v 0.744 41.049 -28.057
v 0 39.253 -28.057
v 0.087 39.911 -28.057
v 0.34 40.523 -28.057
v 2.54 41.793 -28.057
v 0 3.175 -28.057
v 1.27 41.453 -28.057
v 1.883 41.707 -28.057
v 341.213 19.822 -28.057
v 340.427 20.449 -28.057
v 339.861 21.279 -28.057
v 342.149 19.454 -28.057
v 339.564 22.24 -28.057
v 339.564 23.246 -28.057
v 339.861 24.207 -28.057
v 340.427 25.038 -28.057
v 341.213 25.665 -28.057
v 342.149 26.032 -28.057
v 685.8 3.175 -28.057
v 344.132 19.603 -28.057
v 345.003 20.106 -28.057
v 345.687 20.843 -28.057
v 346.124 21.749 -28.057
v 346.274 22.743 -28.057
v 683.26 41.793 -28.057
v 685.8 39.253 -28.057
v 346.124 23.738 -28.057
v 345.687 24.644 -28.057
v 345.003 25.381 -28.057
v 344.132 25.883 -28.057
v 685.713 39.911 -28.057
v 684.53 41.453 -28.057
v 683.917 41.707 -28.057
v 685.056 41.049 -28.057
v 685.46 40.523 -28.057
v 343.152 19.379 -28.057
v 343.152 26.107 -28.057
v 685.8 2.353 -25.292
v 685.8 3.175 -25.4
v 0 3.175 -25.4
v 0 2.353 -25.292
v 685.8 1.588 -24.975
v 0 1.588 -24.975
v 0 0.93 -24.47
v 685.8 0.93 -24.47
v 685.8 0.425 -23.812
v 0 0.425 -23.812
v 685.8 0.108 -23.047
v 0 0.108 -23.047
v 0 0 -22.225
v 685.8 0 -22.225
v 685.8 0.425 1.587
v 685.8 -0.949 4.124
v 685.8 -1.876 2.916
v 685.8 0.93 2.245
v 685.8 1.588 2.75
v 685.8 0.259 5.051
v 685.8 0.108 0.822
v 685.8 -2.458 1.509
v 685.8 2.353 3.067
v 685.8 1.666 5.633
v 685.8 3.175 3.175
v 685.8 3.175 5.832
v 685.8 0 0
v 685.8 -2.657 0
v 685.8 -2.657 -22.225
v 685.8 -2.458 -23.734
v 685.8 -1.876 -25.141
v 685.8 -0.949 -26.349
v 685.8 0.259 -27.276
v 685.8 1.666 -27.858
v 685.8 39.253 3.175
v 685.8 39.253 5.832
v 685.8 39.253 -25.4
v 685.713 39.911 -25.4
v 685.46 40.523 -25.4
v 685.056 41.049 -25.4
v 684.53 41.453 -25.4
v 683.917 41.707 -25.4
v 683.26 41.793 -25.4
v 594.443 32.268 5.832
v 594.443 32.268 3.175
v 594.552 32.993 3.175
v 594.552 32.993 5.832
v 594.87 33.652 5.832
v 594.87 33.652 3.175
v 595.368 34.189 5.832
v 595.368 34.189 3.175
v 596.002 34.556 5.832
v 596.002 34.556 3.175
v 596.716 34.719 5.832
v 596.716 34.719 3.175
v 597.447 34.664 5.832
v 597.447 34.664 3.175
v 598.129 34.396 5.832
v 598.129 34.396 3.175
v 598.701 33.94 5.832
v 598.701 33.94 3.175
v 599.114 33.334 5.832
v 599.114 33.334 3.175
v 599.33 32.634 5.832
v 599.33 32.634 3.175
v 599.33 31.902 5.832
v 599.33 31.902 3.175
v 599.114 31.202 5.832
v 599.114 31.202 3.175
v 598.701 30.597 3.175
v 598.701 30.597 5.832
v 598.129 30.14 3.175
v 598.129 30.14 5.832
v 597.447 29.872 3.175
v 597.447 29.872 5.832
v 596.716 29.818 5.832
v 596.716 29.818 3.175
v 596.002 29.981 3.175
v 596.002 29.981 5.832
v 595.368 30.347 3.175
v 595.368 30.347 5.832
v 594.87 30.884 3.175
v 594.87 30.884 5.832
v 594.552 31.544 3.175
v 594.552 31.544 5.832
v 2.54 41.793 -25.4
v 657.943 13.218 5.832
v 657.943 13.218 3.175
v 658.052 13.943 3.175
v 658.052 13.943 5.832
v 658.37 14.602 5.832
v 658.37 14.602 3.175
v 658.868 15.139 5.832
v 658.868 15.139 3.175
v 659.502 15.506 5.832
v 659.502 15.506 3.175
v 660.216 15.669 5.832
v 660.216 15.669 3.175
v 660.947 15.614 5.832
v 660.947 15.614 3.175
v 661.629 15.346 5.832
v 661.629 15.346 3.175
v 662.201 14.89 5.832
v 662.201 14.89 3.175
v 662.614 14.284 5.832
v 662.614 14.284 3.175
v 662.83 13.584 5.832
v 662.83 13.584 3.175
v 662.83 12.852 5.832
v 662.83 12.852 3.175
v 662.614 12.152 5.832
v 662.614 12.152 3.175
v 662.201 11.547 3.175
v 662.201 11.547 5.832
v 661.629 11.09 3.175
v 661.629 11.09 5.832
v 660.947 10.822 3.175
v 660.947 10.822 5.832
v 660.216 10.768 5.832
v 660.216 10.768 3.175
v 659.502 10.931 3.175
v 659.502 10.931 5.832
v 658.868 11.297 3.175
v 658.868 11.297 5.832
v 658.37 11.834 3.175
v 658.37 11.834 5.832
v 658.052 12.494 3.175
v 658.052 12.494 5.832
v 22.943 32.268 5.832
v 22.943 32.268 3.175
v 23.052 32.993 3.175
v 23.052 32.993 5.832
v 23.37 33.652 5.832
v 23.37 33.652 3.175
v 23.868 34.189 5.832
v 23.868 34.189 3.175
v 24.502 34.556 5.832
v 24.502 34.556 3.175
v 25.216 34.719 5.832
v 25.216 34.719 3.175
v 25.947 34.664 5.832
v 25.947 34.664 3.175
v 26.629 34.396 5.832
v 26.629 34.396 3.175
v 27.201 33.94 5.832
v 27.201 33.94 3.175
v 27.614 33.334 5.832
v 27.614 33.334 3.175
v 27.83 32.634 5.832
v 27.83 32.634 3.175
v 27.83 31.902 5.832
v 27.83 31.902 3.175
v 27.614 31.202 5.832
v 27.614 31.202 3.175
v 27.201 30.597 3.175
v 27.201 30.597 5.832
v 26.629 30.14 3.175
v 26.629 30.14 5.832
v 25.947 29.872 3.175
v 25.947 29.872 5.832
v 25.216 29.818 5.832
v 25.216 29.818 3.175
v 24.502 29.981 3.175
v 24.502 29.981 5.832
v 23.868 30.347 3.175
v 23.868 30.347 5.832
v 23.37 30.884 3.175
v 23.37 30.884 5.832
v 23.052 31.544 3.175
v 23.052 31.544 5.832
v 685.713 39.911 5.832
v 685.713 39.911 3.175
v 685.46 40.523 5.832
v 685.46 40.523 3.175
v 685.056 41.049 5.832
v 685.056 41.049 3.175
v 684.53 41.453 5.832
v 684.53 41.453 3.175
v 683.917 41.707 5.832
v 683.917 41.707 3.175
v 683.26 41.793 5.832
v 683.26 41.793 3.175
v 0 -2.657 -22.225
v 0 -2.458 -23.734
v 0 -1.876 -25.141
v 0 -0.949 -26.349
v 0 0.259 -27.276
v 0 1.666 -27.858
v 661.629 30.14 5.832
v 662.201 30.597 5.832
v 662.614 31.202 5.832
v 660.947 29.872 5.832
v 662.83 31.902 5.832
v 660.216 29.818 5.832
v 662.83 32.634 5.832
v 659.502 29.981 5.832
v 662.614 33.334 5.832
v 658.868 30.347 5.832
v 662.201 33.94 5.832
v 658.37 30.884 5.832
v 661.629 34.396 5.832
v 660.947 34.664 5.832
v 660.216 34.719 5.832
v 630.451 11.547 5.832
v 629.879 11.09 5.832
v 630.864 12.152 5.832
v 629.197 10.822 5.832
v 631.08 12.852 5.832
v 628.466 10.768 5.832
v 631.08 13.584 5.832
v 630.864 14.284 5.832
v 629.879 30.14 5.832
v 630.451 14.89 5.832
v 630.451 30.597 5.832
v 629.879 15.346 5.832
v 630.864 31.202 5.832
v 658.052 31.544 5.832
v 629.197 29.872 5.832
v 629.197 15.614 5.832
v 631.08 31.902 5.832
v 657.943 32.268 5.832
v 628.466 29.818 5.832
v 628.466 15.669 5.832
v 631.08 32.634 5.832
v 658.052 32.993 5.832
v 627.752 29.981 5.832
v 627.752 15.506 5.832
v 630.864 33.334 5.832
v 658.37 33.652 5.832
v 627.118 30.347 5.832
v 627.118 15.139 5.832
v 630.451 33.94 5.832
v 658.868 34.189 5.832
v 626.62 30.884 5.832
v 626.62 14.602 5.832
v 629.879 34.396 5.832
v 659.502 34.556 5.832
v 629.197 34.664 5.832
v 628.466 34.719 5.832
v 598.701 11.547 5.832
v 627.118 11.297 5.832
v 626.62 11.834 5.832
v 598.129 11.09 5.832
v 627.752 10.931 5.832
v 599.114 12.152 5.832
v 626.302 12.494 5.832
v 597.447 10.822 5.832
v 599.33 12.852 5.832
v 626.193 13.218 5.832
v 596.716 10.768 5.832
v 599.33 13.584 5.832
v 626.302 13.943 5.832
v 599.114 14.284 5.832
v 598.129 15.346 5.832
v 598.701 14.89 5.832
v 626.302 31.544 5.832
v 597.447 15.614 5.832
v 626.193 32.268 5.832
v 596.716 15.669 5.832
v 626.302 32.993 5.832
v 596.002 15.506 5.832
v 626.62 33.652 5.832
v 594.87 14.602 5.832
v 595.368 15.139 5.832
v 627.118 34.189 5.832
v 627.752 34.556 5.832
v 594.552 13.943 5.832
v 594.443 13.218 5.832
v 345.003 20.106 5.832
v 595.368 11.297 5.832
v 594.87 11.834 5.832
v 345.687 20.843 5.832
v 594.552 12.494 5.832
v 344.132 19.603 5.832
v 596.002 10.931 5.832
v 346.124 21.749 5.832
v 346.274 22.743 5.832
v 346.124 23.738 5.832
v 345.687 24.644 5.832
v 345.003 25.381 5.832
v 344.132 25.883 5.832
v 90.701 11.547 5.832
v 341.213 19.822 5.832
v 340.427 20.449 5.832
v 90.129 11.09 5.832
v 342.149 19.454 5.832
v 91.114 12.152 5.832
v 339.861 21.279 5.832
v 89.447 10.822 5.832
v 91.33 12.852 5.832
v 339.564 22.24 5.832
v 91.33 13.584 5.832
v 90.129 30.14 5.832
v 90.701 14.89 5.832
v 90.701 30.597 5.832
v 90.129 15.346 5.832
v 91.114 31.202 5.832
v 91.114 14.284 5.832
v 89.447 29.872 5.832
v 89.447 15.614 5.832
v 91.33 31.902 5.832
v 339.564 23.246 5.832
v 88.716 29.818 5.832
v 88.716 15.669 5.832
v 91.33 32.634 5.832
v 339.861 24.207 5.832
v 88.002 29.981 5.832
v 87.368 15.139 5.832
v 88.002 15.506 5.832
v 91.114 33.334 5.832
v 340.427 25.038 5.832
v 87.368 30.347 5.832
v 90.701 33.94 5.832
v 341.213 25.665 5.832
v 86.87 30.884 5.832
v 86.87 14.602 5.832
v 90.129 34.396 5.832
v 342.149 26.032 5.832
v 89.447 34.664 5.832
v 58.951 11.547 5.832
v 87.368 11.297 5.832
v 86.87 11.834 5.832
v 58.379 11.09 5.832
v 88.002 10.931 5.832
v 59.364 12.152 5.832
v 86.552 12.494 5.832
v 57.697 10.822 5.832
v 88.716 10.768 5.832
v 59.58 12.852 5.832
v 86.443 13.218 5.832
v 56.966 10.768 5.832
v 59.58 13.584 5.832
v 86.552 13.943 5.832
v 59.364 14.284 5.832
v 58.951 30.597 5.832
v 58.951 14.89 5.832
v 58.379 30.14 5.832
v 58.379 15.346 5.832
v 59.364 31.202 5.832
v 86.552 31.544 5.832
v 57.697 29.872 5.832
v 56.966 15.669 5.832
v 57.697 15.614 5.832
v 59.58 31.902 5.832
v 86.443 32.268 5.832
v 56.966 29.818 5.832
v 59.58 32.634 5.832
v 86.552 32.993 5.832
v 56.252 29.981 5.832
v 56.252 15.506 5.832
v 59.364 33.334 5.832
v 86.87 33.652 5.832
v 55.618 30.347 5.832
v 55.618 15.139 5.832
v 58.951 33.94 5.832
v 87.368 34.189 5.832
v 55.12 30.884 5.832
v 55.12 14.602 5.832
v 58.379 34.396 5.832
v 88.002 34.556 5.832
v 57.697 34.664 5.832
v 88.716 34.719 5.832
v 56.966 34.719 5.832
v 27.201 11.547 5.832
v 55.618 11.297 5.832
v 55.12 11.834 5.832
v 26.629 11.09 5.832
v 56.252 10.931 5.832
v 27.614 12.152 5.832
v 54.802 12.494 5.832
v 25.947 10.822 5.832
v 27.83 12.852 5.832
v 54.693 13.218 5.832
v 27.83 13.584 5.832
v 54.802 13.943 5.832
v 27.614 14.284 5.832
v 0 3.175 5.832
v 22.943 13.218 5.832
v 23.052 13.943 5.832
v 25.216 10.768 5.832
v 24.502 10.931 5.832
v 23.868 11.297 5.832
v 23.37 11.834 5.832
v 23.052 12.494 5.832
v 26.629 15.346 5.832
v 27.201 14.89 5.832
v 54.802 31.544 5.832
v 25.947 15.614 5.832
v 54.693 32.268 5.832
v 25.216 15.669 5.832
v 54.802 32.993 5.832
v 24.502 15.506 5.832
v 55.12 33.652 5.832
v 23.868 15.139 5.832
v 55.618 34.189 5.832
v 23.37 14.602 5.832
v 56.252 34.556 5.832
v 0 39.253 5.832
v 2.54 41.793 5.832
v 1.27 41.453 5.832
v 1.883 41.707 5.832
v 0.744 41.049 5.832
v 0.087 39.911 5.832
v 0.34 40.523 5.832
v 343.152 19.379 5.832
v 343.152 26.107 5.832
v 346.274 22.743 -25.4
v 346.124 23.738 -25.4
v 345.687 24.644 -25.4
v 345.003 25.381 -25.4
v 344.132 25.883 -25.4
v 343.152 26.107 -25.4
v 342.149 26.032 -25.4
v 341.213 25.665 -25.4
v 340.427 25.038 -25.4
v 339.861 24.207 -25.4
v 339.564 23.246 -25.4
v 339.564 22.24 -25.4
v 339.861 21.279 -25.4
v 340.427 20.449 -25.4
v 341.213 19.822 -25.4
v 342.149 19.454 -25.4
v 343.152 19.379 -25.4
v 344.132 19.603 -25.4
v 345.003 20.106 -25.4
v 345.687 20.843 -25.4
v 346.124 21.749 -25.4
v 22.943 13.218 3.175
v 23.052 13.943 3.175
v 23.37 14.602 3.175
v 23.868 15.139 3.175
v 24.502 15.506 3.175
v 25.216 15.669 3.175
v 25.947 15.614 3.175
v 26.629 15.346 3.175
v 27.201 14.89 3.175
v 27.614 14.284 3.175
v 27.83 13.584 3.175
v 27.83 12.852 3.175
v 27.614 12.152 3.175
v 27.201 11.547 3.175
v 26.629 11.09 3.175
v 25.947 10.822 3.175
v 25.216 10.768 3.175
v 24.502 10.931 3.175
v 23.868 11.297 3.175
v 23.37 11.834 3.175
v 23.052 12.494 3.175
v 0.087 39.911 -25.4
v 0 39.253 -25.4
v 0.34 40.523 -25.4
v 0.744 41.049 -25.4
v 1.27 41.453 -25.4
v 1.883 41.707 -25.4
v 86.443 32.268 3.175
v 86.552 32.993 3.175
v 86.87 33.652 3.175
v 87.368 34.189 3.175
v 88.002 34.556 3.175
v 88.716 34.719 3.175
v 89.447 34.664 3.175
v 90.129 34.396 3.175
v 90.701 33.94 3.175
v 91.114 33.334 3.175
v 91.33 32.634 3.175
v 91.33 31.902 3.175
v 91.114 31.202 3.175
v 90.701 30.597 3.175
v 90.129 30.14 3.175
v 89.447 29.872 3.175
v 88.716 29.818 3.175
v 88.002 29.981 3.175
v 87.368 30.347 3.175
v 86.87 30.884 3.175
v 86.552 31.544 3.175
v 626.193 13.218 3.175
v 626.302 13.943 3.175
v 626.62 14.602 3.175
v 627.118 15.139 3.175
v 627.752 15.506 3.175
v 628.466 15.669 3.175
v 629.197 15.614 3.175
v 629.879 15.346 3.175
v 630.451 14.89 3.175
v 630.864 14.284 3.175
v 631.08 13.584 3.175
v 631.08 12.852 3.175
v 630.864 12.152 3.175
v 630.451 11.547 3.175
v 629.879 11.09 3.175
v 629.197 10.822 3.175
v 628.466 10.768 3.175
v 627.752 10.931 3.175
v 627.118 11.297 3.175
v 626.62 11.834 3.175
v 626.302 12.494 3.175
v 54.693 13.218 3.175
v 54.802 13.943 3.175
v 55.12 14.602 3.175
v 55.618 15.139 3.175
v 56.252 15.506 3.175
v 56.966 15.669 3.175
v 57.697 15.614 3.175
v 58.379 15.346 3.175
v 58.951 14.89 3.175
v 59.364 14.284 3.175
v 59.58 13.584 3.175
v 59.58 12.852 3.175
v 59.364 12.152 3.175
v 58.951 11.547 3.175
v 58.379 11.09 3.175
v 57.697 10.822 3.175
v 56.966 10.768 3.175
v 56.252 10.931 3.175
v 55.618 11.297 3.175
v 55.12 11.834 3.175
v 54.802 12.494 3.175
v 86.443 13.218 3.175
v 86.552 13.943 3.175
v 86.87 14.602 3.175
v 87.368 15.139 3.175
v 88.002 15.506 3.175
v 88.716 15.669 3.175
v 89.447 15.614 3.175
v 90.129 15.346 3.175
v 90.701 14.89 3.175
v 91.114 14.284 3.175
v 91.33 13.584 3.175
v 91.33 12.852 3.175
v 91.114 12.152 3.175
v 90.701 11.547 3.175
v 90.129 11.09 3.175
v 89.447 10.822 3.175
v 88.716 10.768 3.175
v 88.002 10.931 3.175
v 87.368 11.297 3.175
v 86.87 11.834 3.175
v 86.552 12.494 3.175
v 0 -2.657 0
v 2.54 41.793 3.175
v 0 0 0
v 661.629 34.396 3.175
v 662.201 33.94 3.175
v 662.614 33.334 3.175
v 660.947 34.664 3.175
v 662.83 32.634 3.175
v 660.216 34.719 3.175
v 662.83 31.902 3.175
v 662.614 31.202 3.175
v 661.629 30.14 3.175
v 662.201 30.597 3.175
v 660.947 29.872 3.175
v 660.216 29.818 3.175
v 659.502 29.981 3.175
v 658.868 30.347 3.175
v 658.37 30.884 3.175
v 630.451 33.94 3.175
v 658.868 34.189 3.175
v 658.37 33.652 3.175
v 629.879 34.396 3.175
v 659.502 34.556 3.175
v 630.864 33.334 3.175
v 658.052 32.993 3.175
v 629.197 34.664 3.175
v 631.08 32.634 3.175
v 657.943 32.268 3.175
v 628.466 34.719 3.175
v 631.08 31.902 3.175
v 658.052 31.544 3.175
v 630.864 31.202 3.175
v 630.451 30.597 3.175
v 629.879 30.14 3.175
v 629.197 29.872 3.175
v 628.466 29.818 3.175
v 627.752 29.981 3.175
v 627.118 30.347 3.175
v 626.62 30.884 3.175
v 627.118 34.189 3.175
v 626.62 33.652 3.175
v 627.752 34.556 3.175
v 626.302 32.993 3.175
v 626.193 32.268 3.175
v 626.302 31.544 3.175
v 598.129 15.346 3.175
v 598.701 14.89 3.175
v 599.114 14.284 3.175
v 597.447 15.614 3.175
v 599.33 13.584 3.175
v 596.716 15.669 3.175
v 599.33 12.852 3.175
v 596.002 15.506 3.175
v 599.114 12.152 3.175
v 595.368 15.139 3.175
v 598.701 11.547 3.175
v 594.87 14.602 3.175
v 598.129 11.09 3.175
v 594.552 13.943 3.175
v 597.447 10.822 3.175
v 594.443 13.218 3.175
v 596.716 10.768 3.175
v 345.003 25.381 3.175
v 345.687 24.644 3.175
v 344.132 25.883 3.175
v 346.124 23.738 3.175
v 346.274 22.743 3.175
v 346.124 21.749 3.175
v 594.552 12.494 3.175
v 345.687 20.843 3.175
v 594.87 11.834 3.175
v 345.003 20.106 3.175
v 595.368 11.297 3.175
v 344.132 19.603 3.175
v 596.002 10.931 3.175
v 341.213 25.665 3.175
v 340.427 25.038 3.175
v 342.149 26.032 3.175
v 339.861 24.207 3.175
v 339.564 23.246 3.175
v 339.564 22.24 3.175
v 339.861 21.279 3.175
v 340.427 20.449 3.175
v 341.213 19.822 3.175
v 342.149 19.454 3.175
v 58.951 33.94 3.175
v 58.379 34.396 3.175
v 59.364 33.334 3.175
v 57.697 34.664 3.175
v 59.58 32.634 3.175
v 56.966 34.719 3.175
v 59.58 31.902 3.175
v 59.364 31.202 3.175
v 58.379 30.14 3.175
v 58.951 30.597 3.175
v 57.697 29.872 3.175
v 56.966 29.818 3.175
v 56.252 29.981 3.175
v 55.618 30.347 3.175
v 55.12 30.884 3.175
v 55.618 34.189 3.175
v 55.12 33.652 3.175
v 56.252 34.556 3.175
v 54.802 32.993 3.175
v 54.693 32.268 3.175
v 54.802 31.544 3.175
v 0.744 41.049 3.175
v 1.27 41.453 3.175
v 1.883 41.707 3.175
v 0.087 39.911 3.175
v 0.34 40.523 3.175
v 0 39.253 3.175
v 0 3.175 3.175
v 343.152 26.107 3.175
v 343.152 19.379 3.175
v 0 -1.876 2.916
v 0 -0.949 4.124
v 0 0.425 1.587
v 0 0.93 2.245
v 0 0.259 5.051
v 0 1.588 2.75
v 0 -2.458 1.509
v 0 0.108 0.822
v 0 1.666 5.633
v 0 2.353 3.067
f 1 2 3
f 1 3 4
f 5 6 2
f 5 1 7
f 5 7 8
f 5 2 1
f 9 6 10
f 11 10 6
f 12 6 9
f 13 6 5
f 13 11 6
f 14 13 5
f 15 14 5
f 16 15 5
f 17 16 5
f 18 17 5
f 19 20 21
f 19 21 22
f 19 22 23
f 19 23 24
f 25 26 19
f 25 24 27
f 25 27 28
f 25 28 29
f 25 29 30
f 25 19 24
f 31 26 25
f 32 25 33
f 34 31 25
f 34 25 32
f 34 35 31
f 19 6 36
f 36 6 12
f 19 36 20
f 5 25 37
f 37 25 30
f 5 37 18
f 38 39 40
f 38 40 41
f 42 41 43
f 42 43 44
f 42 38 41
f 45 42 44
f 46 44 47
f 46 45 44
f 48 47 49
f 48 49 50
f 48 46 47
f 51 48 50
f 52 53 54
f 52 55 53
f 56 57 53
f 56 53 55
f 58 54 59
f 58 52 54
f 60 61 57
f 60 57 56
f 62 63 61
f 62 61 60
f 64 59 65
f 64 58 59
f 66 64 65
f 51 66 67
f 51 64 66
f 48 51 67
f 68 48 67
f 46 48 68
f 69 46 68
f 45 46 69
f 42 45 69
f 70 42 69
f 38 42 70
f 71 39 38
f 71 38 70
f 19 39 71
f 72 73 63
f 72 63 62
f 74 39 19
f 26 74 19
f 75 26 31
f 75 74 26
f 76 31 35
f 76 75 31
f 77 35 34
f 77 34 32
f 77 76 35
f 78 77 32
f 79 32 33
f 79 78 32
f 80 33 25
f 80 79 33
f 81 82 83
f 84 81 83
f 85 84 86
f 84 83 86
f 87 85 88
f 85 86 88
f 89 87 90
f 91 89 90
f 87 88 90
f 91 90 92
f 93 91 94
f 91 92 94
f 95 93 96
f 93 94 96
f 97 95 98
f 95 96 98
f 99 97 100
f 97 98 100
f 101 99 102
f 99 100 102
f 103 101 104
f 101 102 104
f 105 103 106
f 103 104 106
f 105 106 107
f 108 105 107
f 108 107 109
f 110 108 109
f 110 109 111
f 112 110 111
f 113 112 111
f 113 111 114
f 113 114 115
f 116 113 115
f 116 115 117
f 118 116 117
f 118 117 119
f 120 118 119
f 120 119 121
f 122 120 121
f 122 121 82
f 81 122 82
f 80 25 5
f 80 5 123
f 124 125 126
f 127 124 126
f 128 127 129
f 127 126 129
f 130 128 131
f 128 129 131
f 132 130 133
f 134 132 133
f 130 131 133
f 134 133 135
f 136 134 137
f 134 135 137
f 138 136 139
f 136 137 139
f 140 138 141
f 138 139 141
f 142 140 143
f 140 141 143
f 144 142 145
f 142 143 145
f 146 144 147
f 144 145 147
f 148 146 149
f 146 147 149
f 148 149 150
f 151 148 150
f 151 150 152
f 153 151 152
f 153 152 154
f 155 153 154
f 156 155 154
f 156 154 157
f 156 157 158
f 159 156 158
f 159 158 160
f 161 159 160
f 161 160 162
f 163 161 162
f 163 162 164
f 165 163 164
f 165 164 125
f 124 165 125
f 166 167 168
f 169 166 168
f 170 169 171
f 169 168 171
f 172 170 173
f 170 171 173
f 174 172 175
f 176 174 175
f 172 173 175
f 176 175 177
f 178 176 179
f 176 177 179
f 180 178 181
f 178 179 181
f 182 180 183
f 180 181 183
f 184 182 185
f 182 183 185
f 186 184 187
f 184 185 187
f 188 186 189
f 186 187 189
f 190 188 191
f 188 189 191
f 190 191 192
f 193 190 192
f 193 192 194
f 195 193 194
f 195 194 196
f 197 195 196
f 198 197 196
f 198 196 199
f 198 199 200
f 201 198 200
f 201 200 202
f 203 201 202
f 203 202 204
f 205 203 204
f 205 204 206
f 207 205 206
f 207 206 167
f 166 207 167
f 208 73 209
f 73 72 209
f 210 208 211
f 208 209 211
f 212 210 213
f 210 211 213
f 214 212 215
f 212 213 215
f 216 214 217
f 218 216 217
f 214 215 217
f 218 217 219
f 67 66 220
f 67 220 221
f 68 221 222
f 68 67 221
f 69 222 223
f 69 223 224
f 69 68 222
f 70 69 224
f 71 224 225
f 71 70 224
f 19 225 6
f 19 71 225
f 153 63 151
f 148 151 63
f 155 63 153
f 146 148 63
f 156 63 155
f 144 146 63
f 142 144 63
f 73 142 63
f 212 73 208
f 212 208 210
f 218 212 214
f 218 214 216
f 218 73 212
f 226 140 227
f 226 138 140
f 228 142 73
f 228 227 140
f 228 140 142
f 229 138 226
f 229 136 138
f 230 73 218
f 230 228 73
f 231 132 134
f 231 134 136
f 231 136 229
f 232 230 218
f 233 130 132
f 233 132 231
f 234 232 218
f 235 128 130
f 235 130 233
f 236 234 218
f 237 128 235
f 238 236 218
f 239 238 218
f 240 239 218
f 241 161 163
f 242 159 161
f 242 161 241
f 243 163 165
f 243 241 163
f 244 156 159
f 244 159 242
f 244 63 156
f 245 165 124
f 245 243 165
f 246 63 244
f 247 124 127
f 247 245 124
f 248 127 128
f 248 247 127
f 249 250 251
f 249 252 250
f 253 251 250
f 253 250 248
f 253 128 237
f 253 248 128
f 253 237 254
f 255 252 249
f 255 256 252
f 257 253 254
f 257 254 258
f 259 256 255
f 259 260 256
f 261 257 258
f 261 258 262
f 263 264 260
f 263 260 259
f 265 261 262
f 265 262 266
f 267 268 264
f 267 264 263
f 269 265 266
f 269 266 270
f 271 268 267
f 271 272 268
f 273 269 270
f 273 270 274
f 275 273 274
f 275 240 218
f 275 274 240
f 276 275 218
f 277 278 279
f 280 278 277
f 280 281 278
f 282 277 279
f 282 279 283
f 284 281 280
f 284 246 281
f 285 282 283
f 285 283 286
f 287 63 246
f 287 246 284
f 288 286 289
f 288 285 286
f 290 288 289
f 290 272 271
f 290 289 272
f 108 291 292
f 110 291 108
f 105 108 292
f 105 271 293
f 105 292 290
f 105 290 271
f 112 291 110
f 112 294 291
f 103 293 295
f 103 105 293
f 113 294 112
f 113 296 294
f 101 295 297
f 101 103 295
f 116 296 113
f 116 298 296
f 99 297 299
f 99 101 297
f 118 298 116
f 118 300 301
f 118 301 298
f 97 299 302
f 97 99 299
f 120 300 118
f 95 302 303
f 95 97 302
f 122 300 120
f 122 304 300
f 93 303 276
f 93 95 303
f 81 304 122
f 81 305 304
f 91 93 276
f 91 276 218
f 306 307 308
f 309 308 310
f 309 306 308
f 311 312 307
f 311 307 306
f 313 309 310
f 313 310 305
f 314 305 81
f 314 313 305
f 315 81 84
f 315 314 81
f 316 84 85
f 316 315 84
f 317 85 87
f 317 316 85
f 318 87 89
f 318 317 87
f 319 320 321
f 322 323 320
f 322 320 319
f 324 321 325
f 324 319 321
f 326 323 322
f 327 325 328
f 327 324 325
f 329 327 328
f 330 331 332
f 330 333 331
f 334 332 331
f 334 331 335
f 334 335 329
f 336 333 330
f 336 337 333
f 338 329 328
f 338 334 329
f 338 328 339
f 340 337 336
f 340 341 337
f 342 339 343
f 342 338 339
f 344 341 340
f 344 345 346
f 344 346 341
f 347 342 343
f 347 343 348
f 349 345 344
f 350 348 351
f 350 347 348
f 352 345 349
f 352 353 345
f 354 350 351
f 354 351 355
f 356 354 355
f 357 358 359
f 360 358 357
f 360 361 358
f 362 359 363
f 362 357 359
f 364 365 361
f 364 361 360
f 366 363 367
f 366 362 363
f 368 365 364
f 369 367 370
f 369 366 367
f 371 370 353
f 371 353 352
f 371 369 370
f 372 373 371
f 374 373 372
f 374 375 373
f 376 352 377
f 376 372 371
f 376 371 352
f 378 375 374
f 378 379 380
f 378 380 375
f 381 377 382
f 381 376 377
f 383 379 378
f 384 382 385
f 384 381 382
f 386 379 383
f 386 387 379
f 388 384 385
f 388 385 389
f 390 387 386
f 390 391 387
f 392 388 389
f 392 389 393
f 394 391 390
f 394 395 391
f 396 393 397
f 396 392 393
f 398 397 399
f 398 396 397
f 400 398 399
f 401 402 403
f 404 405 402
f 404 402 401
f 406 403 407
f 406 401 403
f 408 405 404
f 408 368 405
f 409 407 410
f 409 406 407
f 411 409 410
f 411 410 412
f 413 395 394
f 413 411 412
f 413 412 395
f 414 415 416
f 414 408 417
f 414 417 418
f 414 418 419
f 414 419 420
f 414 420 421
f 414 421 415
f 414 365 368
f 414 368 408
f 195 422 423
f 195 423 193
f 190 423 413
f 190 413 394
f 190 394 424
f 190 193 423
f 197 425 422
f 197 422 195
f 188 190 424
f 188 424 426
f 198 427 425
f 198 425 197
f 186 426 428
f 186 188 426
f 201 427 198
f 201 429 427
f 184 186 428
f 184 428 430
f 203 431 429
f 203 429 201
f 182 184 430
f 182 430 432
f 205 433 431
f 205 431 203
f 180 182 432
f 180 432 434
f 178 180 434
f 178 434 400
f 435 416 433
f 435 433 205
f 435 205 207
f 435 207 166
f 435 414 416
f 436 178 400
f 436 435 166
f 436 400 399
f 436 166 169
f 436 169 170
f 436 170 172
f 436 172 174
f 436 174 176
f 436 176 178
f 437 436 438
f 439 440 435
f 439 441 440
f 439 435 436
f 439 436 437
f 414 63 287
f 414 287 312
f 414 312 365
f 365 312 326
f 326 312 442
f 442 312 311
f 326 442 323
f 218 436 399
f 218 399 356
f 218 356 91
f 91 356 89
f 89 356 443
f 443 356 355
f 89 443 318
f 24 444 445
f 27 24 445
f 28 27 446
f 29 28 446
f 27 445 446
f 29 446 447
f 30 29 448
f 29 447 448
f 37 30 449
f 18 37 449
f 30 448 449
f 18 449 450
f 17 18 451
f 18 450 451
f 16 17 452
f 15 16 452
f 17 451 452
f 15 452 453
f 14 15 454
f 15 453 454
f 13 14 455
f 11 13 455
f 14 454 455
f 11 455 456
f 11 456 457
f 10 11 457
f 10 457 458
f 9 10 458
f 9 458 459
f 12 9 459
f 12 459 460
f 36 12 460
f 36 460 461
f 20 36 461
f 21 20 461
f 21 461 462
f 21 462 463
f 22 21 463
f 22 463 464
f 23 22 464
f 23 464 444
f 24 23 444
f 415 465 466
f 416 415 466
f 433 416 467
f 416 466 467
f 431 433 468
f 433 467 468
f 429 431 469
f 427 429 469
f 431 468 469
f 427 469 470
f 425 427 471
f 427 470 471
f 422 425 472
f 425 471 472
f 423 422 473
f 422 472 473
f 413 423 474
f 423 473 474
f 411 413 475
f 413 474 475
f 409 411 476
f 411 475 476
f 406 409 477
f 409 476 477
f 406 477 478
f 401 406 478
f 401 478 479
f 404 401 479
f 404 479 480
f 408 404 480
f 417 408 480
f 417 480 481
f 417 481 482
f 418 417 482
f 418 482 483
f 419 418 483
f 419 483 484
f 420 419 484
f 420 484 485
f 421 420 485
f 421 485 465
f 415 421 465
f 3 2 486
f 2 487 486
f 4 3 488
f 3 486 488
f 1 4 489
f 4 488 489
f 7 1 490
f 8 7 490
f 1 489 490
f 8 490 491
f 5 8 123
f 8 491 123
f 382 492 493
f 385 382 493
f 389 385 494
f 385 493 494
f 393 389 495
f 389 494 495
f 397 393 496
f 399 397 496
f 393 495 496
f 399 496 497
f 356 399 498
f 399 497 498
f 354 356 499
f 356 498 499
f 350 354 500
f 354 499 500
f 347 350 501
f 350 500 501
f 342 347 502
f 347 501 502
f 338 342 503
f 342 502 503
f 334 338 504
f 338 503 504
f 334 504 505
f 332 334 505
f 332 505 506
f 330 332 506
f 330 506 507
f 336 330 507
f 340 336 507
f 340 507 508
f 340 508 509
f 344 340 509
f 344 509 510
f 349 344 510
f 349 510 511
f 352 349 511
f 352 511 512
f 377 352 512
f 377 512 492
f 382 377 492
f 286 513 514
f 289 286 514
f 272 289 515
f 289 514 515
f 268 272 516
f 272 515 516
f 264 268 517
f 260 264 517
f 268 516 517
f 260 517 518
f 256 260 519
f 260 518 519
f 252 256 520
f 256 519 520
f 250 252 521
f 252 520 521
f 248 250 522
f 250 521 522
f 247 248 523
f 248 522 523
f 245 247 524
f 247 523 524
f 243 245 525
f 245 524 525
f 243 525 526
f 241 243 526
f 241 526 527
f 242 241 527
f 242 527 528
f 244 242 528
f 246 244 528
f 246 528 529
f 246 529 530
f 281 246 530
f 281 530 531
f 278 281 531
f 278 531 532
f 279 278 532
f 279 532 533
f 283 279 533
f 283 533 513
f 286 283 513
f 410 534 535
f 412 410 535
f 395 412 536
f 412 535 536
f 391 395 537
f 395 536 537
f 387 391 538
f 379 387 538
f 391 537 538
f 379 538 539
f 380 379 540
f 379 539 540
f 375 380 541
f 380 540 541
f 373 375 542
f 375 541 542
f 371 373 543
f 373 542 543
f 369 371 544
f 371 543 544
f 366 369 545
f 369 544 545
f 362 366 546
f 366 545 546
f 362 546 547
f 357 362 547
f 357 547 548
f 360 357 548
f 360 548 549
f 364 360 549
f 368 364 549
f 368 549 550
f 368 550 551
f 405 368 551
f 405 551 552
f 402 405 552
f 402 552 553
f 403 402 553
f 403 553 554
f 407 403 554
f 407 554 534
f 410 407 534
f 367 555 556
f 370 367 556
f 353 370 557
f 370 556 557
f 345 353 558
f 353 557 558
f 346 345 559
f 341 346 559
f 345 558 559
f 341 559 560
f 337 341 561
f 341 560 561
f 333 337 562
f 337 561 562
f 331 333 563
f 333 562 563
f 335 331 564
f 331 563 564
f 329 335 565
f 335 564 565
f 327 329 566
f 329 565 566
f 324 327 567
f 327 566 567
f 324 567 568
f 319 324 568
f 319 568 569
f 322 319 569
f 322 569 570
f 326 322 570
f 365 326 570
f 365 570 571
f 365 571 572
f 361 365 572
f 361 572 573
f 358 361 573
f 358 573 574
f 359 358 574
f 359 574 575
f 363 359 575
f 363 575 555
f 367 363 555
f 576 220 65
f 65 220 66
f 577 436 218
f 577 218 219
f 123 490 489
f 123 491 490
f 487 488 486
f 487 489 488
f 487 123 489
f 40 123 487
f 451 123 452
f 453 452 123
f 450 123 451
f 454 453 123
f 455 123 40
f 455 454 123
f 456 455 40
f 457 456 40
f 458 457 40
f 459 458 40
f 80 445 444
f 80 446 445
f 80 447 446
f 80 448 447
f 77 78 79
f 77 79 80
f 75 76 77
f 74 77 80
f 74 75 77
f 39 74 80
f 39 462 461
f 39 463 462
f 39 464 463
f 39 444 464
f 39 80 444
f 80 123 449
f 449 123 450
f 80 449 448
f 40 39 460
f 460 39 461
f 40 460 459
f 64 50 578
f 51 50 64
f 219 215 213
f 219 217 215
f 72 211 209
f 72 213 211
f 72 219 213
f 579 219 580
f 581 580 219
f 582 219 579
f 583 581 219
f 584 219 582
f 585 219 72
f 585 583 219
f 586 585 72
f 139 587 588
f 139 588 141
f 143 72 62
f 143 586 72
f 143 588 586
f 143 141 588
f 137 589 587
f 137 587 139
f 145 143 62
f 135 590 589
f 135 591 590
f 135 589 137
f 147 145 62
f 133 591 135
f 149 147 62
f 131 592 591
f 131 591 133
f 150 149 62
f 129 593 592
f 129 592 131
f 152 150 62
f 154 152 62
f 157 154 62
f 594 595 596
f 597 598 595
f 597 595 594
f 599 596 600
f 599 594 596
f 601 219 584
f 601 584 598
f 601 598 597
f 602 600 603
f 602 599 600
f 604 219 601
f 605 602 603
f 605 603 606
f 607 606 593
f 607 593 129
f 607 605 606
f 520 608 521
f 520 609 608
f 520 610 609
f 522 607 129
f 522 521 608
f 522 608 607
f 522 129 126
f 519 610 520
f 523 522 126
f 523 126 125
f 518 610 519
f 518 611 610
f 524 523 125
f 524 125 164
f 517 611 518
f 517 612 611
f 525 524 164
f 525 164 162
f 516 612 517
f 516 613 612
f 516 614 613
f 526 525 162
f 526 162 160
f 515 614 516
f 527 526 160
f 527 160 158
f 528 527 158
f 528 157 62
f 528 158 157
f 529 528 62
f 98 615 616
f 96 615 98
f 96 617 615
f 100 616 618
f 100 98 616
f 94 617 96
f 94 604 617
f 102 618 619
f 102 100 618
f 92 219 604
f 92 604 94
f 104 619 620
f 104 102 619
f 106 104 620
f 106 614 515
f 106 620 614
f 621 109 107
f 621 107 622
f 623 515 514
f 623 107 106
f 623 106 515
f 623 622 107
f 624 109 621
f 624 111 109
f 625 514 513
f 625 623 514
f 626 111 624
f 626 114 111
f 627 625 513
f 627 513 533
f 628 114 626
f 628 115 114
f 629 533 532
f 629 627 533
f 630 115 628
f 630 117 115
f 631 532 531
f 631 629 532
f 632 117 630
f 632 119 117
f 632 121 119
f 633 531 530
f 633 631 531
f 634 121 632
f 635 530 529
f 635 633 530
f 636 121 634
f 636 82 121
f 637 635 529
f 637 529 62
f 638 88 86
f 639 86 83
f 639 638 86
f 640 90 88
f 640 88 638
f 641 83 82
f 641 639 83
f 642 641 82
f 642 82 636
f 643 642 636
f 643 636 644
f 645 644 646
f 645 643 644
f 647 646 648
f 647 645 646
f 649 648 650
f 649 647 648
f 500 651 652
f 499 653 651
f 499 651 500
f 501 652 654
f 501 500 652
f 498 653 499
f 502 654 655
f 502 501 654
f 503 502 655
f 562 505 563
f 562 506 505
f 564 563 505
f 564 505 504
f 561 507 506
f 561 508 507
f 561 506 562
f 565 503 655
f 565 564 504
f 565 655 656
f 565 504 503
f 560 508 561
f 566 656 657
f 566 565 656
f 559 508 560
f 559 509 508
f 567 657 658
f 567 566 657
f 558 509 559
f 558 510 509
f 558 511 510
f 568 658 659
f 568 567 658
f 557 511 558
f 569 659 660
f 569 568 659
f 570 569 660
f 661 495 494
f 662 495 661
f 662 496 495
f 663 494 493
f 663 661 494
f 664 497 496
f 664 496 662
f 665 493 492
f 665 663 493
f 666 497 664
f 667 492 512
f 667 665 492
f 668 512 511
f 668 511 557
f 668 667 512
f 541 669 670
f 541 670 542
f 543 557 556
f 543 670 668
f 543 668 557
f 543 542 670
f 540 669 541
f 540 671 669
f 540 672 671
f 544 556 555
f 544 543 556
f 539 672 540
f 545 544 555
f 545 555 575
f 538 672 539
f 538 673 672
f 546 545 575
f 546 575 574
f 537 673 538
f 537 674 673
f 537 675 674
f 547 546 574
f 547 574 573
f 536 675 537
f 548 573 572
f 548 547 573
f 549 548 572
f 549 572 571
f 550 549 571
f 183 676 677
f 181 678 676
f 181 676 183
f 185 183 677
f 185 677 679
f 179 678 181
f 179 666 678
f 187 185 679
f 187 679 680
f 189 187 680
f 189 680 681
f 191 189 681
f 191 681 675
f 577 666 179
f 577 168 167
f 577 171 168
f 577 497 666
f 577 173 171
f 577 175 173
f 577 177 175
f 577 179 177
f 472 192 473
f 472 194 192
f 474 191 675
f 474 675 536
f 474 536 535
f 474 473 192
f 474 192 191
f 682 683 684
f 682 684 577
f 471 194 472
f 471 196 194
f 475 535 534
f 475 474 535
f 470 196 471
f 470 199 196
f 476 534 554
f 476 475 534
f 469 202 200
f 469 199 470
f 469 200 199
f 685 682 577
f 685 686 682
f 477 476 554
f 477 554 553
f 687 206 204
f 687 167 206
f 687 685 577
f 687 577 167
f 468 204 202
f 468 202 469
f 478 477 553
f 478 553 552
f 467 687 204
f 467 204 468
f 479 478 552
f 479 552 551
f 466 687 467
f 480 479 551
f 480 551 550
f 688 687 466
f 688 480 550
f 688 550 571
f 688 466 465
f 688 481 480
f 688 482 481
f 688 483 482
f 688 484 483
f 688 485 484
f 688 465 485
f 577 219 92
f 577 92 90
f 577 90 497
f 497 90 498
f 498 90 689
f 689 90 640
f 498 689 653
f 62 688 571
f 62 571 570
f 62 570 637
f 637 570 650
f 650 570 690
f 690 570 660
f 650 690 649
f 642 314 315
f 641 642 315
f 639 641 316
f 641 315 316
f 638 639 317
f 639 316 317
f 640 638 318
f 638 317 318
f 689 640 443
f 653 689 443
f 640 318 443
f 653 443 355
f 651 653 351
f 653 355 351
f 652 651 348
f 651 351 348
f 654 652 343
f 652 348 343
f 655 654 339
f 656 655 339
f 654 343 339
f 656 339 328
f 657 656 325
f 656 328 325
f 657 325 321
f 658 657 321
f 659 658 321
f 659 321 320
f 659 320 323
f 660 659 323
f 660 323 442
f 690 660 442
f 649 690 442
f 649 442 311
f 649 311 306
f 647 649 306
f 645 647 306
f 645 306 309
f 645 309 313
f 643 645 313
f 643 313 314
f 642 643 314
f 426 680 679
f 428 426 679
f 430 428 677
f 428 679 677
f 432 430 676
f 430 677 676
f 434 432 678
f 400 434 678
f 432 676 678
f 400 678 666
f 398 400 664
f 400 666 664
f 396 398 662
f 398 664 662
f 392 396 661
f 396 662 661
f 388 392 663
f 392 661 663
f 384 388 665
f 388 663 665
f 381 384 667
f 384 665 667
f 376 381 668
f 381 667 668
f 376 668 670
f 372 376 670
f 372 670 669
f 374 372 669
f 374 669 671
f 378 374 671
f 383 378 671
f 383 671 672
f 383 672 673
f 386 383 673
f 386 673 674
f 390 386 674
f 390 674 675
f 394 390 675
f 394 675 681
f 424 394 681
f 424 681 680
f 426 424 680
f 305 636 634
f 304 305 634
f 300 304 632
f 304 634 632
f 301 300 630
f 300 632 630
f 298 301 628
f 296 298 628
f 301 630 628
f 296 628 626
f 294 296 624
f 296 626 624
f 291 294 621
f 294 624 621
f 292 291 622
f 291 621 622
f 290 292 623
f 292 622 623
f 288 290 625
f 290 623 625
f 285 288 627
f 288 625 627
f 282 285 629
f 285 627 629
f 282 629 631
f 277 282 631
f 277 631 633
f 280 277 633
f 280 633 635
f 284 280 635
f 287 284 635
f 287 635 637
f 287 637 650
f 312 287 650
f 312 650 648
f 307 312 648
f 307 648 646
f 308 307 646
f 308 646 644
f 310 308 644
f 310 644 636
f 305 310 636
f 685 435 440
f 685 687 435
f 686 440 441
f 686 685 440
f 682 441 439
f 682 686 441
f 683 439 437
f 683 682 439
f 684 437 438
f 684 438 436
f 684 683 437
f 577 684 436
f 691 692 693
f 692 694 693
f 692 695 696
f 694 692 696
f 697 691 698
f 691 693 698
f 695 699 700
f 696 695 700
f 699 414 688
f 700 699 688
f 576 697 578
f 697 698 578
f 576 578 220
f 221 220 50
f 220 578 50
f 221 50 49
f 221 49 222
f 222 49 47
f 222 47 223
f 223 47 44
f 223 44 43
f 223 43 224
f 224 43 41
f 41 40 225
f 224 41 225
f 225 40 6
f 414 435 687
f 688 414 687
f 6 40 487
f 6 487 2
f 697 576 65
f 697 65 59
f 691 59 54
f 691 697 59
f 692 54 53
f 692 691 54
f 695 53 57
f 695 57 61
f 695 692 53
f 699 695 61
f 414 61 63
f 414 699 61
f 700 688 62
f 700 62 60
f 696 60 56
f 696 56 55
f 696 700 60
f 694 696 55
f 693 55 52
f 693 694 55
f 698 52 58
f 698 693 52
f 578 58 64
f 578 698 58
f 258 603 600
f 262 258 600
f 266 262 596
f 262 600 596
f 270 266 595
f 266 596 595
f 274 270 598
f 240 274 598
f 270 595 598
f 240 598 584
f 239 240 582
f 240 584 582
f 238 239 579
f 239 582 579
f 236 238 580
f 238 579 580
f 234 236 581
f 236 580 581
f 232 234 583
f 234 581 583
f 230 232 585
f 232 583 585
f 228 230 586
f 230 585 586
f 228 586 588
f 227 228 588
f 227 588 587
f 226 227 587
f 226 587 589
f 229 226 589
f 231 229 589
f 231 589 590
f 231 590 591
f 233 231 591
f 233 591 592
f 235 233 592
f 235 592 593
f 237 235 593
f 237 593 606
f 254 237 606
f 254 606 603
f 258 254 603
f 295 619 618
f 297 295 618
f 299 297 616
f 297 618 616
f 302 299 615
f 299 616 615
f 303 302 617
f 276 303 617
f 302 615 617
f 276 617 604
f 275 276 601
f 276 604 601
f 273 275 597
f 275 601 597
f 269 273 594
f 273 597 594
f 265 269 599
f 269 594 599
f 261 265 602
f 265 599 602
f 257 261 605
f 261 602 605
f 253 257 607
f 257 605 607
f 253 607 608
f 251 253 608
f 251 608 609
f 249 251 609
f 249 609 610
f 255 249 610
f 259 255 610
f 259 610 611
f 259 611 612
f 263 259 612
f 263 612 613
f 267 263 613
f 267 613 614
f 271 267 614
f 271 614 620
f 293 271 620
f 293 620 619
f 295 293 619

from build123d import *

# Parameters (mm, degrees)
SKETCH1_W                        = 685.8
SKETCH1_H                        = 22.225
BASE_FLANGE1_DEPTH               = 2.65684
EDGE_FLANGE1_DEPTH               = 685.8
EDGE_FLANGE2_DEPTH               = 685.8
F_17_64_0_26563_DIAMETER_HOLE1_D = 6.747002
F_10_0_1935_DIAMETER_HOLE1_D     = 4.9149
F_10_0_1935_DIAMETER_HOLE1_DEPTH = 2.65684
FILLET1_R                        = 2.54


# Sheet-metal steps are written as plain solids
with BuildPart() as part:
    # Sketch1 → Base-Flange1 (new body)
    with BuildSketch(Plane(origin=(0, 0, 0), x_dir=(1, 0, 0), z_dir=(0, 1, 0))):
        with Locations((342.9, 11.1125)):
            Rectangle(SKETCH1_W, SKETCH1_H)
    extrude(amount=-BASE_FLANGE1_DEPTH)

    # Edge-Flange1 section (across the edge) → Edge-Flange1 (add)
    with BuildSketch(Plane(origin=(0, 0, 3.175), x_dir=(0, 0, -1), z_dir=(1, 0, 0))):
        with BuildLine():
            Line((-2.65684, 3.175), (-2.65684, 41.79316))
            Line((-2.65684, 41.79316), (0, 41.79316))
            Line((0, 41.79316), (0, 3.175))
            ThreePointArc((0, 3.175), (0.92993597, 0.92993597), (3.175, 0))
            Line((3.175, 0), (3.175, -2.65684))
            ThreePointArc((3.175, -2.65684), (-0.948733611, -0.948733611), (-2.65684, 3.175))
        make_face()
    extrude(amount=EDGE_FLANGE1_DEPTH)

    # Edge-Flange2 section (across the edge) → Edge-Flange2 (add)
    with BuildSketch(Plane(origin=(685.8, 0, -25.4), x_dir=(0, 0, 1), z_dir=(-1, 0, 0))):
        with BuildLine():
            Line((-2.65684, 3.175), (-2.65684, 41.79316))
            Line((-2.65684, 41.79316), (0, 41.79316))
            Line((0, 41.79316), (0, 3.175))
            ThreePointArc((0, 3.175), (0.92993597, 0.92993597), (3.175, 0))
            Line((3.175, 0), (3.175, -2.65684))
            ThreePointArc((3.175, -2.65684), (-0.948733611, -0.948733611), (-2.65684, 3.175))
        make_face()
    extrude(amount=EDGE_FLANGE2_DEPTH)

    # 17/64 (0.26563) Diameter Hole1 (through all)
    with Locations(Plane(origin=(0, 0, -28.05684), x_dir=(-1, 0, 0), z_dir=(0, 0, -1))):
        with Locations((-342.9, 22.74316)):
            Hole(F_17_64_0_26563_DIAMETER_HOLE1_D / 2)

    # #10 (0.1935) Diameter Hole1
    with Locations(Plane.XY.offset(5.83184)):
        with Locations((596.9, 13.21816), (596.9, 32.26816), (628.65, 32.26816), (628.65, 13.21816), (660.4, 13.21816), (660.4, 32.26816), (88.9, 13.21816), (88.9, 32.26816), (57.15, 13.21816), (57.15, 32.26816), (25.4, 13.21816), (25.4, 32.26816)):
            Hole(F_10_0_1935_DIAMETER_HOLE1_D / 2, depth=F_10_0_1935_DIAMETER_HOLE1_DEPTH)

    # Fillet1
    fillet1_edges = [part.edges().sort_by_distance(p)[0] for p in [
        (0, 41.79316, 4.50342),
        (685.8, 41.79316, 4.50342),
        (685.8, 41.79316, -26.72842),
        (0, 41.79316, -26.72842),
    ]]
    fillet(fillet1_edges, radius=FILLET1_R)


solid = part.part
